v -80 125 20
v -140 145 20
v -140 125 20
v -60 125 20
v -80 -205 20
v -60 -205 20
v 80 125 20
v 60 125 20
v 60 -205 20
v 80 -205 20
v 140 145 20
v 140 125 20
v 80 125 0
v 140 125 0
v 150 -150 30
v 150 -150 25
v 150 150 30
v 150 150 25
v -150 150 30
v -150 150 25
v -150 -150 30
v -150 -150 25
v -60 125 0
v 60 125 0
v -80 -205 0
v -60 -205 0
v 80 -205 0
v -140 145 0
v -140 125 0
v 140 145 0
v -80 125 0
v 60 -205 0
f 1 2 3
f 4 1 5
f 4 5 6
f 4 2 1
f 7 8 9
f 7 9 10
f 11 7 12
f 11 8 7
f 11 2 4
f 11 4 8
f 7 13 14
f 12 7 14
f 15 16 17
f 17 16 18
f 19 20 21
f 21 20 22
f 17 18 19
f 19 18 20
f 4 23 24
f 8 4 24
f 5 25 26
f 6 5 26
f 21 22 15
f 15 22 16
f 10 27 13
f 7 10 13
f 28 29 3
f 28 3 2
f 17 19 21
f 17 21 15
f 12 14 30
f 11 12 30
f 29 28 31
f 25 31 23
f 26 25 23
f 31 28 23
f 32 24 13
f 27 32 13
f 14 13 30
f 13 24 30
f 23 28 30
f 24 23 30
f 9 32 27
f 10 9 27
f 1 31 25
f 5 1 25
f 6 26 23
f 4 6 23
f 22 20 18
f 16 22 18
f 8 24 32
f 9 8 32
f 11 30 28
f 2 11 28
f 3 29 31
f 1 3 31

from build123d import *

# Parameters (mm, degrees)
F1_START = 25
F0_W     = 20
F0_H     = 275
F0_W_2   = 120
F0_W_3   = 60
F0_H_2   = 20
F1_DEPTH = 5
F0_H_3   = 55
F2_DEPTH = 20


# Not quite as in the source:
# - a feature names something its author has since deleted; it is built from what else it names


with BuildPart() as f1:
    # F0 (on Top) → F1 (new body)
    with BuildSketch(Plane.XY.offset(F1_START)):
        Polygon((150, -150), (150, 150), (-150, 150), (-150, -150), (-80, -150), (-80, 125), (-140, 125), (-140, 145), (-80, 145), (-60, 145), (60, 145), (80, 145), (140, 145), (140, 125), (80, 125), (80, -150), align=None)
        with Locations((-70, -12.5)):
            Rectangle(F0_W, F0_H)
        with Locations((0, -12.5)):
            Rectangle(F0_W_2, F0_H)
        with Locations((70, -12.5)):
            Rectangle(F0_W, F0_H)
        with Locations((-110, 135)):
            Rectangle(F0_W_3, F0_H_2)
        with Locations((-70, 135)):
            Rectangle(F0_W, F0_H_2)
        with Locations((0, 135)):
            Rectangle(F0_W_2, F0_H_2)
        with Locations((70, 135)):
            Rectangle(F0_W, F0_H_2)
        with Locations((110, 135)):
            Rectangle(F0_W_3, F0_H_2)
    extrude(amount=F1_DEPTH)


with BuildPart() as f2:
    # F0 (on Top) → F2 (new body)
    with BuildSketch(Plane.XY):
        with Locations((-110, 135)):
            Rectangle(F0_W_3, F0_H_2)
        with Locations((-70, 135)):
            Rectangle(F0_W, F0_H_2)
        with Locations((0, 135)):
            Rectangle(F0_W_2, F0_H_2)
        with Locations((70, 135)):
            Rectangle(F0_W, F0_H_2)
        with Locations((110, 135)):
            Rectangle(F0_W_3, F0_H_2)
        with Locations((70, -12.5)):
            Rectangle(F0_W, F0_H)
        with Locations((-70, -12.5)):
            Rectangle(F0_W, F0_H)
        with Locations((-70, -177.5)):
            Rectangle(F0_W, F0_H_3)
        with Locations((70, -177.5)):
            Rectangle(F0_W, F0_H_3)
    extrude(amount=F2_DEPTH)


solid = Compound([f1.part, f2.part])
